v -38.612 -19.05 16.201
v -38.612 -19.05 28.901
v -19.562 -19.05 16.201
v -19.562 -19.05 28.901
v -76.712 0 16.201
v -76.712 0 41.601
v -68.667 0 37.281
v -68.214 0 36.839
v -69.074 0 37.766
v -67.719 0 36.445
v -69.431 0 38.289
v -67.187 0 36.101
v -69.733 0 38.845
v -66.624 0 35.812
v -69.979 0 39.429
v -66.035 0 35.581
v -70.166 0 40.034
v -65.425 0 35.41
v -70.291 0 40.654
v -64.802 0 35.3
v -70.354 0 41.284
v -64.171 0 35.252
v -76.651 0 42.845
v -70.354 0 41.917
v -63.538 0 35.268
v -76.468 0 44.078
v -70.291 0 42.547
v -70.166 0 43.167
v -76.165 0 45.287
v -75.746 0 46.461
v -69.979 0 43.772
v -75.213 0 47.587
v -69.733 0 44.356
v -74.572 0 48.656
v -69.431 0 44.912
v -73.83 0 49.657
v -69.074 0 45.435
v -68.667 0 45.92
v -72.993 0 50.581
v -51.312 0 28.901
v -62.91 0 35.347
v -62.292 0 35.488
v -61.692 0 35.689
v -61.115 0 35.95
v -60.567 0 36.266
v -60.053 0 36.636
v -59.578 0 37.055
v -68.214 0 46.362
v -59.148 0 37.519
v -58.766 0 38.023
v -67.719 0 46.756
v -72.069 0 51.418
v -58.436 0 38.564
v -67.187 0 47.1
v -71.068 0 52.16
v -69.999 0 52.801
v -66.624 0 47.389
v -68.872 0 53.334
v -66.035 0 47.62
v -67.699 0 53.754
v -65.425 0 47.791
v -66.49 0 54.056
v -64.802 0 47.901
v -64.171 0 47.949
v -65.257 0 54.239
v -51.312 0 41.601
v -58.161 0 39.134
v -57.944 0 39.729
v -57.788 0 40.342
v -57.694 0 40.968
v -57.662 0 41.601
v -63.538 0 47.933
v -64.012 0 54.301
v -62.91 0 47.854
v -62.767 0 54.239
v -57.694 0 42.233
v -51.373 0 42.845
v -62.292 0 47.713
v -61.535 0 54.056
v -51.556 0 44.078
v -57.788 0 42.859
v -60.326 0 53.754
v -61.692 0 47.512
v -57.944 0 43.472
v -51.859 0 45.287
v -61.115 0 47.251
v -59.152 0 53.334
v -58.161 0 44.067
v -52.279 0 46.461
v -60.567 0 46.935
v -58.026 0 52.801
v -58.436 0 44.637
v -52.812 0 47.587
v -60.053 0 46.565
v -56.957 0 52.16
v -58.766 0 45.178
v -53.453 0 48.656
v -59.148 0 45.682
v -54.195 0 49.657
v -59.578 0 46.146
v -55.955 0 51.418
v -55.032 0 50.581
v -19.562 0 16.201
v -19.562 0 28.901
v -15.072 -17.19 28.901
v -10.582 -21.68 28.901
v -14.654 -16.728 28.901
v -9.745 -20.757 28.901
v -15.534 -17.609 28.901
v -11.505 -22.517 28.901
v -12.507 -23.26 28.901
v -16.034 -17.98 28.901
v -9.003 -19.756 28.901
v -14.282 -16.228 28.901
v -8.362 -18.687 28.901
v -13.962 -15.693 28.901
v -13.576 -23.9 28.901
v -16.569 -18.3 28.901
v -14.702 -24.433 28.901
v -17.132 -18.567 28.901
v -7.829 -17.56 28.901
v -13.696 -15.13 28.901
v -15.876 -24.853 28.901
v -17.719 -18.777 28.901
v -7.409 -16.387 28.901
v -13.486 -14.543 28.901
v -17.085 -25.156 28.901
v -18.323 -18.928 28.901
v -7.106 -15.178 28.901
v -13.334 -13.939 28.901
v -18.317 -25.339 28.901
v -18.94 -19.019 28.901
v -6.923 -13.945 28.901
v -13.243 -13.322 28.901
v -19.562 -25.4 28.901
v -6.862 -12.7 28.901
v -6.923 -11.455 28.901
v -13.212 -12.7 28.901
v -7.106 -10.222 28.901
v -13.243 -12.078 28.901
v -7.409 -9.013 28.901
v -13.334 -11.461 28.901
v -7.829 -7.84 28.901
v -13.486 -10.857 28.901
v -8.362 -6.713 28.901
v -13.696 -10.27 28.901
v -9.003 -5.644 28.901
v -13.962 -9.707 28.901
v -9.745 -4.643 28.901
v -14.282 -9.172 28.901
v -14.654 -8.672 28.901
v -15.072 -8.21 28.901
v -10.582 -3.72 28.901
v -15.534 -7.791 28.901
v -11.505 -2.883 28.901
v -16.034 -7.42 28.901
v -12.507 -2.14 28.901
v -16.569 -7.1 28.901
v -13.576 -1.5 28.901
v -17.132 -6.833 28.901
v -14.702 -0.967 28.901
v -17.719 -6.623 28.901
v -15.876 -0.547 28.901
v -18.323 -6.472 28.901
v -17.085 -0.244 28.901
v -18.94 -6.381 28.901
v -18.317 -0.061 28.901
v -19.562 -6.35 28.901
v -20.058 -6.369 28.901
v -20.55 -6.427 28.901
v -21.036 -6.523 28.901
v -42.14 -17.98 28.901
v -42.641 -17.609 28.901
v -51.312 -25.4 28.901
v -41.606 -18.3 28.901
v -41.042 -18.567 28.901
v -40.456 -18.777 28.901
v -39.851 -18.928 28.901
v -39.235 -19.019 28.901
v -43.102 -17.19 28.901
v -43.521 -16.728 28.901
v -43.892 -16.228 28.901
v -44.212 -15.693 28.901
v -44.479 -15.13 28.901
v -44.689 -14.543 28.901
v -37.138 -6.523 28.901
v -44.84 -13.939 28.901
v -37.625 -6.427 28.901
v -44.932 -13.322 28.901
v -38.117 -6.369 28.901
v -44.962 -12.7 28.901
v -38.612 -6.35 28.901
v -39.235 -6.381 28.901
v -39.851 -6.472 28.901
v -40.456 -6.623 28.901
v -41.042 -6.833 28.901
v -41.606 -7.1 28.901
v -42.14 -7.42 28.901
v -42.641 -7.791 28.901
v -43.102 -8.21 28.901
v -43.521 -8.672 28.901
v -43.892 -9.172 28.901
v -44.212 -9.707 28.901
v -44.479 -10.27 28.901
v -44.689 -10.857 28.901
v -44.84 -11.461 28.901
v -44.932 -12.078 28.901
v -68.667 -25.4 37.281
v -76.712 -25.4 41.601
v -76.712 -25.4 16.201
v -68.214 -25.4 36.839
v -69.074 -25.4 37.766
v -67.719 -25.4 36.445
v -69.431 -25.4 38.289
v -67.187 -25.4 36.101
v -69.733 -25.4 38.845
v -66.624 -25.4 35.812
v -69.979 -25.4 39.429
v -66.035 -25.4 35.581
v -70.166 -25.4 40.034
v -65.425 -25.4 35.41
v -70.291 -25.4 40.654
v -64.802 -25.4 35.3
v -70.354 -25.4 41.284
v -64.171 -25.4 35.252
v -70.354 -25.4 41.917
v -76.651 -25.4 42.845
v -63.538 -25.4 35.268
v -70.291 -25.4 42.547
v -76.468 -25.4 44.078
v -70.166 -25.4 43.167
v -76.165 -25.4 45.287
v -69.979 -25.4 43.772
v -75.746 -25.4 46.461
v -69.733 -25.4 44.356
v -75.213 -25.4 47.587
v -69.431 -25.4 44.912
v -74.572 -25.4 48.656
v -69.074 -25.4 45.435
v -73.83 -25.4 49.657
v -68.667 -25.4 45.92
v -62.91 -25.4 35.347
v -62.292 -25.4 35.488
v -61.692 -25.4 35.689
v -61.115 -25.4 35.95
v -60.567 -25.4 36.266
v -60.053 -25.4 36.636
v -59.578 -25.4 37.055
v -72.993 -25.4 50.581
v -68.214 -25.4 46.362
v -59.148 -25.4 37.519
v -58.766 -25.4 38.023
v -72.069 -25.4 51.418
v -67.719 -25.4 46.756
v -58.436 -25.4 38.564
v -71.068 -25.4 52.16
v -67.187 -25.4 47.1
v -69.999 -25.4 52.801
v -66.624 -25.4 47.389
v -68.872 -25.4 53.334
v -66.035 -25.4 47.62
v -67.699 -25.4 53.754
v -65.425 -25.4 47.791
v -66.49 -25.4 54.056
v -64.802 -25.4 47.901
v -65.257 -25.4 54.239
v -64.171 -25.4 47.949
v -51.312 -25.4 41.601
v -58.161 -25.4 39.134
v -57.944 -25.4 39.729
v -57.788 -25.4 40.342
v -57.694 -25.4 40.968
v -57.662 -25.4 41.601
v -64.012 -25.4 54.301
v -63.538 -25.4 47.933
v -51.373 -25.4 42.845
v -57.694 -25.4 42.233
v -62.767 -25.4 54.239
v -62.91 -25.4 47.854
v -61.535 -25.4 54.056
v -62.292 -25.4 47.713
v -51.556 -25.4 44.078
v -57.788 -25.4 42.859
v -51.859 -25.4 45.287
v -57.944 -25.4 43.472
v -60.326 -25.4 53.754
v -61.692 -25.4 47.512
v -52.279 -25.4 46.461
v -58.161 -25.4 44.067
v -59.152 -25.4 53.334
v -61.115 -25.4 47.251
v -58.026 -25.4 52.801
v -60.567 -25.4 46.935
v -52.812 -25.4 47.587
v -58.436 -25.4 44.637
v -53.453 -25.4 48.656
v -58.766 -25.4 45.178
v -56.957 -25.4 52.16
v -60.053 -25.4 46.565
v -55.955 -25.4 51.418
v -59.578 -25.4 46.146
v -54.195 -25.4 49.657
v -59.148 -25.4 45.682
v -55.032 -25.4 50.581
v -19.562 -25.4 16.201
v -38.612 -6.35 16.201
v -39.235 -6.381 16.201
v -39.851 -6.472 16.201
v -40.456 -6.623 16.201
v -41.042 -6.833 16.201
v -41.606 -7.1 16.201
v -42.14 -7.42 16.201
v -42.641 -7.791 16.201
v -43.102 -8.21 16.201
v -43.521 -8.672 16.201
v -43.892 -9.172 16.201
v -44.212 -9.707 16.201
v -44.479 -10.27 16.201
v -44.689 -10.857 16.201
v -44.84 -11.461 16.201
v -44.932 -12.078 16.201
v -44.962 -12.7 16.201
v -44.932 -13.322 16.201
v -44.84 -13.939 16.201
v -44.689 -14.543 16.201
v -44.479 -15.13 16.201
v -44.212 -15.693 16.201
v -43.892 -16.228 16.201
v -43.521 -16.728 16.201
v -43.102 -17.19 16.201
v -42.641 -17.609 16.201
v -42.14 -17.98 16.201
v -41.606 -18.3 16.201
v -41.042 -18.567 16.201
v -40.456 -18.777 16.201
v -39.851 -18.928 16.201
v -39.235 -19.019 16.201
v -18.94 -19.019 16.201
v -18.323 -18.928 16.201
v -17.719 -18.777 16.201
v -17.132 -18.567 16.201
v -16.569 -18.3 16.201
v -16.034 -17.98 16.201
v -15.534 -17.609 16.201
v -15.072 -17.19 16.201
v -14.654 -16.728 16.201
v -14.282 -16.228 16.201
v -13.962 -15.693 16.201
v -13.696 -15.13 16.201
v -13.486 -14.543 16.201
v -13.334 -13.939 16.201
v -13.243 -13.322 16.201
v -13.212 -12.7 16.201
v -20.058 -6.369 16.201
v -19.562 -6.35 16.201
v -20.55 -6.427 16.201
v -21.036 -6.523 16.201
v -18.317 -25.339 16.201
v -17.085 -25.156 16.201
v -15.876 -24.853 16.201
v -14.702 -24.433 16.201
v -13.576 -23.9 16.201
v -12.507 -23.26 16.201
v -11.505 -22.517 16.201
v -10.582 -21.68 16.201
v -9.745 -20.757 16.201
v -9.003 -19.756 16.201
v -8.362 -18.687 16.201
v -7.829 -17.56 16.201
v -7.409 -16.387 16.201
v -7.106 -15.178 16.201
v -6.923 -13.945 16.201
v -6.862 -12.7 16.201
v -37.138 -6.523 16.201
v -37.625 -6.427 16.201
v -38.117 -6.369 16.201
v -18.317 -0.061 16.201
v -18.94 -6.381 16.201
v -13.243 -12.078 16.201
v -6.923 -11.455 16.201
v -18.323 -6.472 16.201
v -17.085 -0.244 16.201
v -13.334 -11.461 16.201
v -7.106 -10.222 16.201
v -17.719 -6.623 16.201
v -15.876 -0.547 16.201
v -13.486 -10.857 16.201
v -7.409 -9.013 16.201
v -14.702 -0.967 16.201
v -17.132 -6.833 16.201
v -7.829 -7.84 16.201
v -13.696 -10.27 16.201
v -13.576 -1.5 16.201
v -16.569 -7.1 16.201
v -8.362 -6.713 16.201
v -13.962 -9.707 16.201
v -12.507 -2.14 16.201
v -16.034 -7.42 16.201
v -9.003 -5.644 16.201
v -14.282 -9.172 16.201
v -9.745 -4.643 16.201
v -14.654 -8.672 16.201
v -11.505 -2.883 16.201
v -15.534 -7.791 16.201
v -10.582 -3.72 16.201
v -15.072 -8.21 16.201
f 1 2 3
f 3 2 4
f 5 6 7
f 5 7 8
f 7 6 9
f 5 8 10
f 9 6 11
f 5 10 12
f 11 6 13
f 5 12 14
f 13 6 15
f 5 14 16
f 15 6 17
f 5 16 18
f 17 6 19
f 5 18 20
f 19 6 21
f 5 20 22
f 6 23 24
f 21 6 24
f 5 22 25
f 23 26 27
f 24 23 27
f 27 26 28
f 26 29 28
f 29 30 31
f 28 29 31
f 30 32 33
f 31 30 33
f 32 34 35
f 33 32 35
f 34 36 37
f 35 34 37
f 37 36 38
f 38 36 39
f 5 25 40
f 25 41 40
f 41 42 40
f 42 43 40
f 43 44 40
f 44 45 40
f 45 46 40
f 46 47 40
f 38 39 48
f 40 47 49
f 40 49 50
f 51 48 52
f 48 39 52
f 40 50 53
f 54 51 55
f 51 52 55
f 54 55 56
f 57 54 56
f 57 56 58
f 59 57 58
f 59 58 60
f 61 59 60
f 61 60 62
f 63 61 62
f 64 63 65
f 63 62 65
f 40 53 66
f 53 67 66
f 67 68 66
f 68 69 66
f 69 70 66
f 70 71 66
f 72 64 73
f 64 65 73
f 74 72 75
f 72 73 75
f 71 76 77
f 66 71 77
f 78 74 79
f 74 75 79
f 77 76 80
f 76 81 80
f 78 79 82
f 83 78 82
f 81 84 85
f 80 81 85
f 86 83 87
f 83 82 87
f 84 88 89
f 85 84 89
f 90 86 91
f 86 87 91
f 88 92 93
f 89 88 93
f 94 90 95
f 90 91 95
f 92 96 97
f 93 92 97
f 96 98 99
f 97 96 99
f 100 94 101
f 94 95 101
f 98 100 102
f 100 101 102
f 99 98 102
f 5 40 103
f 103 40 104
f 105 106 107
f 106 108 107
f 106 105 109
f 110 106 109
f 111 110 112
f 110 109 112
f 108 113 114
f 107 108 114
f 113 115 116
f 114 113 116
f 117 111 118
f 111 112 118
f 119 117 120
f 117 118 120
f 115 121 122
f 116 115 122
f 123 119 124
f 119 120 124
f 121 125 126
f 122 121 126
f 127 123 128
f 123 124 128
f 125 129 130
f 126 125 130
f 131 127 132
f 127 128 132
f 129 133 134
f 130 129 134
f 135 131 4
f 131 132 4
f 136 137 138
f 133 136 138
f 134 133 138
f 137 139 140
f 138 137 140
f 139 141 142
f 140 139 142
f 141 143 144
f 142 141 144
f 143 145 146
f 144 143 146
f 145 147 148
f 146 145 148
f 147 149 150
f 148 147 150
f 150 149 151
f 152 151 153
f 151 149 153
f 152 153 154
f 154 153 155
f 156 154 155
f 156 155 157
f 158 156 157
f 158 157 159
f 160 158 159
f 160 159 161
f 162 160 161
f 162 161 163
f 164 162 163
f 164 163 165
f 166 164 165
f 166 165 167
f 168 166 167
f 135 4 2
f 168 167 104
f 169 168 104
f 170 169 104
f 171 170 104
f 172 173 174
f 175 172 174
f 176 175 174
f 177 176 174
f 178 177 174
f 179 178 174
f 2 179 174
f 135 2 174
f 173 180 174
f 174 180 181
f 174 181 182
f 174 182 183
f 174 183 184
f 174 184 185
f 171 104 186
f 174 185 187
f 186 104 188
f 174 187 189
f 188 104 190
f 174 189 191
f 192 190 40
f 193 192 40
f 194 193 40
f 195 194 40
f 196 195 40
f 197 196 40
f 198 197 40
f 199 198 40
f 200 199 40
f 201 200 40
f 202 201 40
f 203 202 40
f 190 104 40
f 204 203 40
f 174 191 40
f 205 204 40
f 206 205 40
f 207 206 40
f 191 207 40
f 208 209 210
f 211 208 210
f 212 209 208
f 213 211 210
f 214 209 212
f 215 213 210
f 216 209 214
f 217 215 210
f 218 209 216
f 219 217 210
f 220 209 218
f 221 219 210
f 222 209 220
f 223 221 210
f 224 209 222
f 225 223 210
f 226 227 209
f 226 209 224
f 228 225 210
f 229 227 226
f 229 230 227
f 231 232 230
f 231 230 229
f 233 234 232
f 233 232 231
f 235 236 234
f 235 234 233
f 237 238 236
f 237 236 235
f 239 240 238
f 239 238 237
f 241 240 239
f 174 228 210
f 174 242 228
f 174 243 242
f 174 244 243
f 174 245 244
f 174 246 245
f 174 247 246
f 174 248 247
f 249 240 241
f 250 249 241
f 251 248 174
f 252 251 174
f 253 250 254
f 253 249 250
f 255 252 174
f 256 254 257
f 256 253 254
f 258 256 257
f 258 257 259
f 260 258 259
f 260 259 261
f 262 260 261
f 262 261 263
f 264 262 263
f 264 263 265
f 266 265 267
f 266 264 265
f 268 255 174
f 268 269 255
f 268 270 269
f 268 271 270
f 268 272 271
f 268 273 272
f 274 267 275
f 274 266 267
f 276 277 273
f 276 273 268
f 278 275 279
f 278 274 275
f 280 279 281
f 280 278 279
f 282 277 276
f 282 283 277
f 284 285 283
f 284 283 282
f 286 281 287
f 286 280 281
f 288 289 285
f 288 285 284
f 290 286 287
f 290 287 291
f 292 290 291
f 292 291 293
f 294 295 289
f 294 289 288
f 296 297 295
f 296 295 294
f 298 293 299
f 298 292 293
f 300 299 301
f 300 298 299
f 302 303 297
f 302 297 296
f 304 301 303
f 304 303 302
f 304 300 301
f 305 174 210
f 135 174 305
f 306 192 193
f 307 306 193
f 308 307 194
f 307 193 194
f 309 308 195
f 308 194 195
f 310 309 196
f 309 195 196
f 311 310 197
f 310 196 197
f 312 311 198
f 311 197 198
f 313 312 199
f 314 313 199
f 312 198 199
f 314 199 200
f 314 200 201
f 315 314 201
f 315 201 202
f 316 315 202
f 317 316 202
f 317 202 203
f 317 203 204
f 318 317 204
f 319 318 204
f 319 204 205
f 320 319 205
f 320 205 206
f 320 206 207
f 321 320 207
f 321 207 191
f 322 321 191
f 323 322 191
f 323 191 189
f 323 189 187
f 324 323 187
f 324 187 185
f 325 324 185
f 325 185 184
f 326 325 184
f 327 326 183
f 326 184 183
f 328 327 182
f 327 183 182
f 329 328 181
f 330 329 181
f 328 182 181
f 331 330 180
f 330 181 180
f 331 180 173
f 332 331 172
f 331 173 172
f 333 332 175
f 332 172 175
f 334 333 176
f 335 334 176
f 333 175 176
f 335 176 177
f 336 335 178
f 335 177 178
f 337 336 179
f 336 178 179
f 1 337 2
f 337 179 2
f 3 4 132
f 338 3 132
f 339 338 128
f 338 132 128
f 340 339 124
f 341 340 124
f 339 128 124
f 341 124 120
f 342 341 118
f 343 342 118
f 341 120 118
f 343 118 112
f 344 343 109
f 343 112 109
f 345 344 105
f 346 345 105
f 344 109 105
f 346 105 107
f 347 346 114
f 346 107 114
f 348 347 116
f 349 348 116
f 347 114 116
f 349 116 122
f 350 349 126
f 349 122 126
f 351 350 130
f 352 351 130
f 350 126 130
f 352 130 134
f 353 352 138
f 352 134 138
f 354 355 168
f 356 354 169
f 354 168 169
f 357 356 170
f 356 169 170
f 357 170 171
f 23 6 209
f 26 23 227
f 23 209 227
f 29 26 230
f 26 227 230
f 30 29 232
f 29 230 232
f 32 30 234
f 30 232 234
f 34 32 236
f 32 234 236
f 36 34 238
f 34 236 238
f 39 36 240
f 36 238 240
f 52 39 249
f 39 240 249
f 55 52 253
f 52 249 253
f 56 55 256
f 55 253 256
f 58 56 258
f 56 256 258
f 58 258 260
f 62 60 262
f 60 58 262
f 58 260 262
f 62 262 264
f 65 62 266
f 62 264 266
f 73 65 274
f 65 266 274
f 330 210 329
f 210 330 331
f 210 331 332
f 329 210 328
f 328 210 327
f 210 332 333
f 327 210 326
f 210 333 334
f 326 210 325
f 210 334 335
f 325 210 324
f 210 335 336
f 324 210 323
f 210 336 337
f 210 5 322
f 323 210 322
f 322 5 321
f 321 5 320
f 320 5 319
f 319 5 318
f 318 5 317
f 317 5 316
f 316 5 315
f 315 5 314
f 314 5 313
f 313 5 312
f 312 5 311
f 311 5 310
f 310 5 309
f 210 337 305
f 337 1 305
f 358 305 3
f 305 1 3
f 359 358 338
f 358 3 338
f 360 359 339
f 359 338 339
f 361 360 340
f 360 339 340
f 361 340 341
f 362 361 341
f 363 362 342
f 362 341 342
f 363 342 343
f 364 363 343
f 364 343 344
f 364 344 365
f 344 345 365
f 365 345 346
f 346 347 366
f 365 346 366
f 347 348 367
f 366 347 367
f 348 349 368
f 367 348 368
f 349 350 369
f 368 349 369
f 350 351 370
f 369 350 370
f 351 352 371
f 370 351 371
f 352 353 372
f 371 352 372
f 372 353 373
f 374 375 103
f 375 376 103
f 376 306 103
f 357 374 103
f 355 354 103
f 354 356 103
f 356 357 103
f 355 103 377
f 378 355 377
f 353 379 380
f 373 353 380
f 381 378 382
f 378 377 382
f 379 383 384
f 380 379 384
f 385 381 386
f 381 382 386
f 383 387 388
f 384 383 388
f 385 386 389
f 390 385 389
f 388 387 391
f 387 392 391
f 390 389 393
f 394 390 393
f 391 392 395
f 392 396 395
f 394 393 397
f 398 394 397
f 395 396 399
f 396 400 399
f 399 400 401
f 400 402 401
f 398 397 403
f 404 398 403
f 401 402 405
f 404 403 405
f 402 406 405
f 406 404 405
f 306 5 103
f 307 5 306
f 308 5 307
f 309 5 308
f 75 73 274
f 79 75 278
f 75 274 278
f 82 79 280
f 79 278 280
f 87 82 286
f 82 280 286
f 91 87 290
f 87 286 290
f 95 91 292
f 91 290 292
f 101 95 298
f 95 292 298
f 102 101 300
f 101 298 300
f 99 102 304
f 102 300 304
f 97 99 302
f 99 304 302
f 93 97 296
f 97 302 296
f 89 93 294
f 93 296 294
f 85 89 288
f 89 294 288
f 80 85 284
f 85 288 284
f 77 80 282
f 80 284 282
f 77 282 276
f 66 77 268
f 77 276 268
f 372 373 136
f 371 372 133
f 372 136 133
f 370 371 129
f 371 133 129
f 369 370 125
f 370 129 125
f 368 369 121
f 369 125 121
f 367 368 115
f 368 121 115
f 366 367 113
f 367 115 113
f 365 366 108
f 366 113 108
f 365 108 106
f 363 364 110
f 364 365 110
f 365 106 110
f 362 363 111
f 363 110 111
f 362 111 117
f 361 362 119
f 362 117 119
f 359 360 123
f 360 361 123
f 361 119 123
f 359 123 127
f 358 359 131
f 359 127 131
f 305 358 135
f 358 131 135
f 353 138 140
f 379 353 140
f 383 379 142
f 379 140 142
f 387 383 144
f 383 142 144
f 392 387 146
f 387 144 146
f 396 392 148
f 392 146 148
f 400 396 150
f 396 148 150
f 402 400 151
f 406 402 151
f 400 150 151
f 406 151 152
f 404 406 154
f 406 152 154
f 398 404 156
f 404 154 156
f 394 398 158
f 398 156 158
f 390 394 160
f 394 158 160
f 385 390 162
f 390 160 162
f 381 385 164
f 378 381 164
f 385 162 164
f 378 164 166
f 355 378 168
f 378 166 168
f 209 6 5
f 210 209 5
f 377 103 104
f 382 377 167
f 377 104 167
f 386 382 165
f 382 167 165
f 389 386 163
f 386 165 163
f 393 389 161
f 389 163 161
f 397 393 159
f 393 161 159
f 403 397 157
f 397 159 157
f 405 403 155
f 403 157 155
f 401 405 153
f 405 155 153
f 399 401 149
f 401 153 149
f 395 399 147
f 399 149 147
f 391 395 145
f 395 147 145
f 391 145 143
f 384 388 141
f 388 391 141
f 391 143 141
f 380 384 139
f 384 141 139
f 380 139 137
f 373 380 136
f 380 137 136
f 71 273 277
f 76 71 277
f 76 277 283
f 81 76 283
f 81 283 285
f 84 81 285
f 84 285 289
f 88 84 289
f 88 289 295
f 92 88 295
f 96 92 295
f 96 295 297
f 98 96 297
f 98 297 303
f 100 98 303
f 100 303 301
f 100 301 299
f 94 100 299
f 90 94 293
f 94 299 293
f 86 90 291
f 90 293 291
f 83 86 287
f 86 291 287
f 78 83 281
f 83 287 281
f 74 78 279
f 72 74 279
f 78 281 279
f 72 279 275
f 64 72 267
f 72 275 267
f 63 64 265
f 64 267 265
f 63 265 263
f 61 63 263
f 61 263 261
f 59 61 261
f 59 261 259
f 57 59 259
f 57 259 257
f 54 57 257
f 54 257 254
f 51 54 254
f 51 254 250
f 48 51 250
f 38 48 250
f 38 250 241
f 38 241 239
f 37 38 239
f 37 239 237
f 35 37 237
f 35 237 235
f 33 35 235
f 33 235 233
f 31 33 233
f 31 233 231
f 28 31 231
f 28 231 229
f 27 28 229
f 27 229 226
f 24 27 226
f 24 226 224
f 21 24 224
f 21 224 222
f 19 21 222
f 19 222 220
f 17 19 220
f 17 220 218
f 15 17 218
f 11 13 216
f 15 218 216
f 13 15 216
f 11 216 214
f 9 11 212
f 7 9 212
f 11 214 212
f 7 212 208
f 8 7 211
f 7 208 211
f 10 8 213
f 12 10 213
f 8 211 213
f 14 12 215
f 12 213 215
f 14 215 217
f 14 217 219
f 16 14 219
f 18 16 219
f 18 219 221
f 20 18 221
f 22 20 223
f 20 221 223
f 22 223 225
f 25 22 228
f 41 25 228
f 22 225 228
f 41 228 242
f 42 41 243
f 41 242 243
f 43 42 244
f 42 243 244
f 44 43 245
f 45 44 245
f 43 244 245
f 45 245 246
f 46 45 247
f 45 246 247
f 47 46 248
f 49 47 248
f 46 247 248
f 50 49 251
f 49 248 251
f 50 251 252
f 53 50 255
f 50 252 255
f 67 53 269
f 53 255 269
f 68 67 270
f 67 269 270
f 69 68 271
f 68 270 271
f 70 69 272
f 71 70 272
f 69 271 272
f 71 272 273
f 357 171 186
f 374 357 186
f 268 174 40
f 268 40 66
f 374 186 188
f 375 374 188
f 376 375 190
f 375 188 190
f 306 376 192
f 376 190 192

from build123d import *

# Parameters (mm, degrees)
F1_DEPTH  = 25.4
F4_DEPTH  = 25.401
F3_R      = 6.35
F5_DEPTH  = 25.401
F8_DEPTH  = 12.701
F9_DEPTH  = 12.701
F11_DEPTH = 12.701


with BuildPart() as f1:
    # F0 (on Front) → F1 (new body)
    with BuildSketch(Plane.XZ):
        Polygon((-51.3122697964, 54.3005044411), (-76.7122697964, 54.3005044411), (-76.7122697964, 16.2005044411), (-6.8622697964, 16.2005044411), (-6.8622697964, 28.9005044411), (-51.3122697964, 28.9005044411), align=None)
    extrude(amount=F1_DEPTH)

    # F2 (on face) → F4 (cut, through all)
    with BuildSketch(Plane.XZ.offset(25.4)):
        with BuildLine():
            ThreePointArc((-76.7122697964, 41.6005044411), (-72.9925259175, 50.5807605622), (-64.0122697964, 54.3005044411))
            Line((-64.0122697964, 54.3005044411), (-76.7122697964, 54.3005044411))
            Line((-76.7122697964, 54.3005044411), (-76.7122697964, 41.6005044411))
        make_face()
        with BuildLine():
            ThreePointArc((-64.0122697964, 54.3005044411), (-55.0320136754, 50.5807605622), (-51.3122697964, 41.6005044411))
            Line((-51.3122697964, 41.6005044411), (-51.3122697964, 54.3005044411))
            Line((-51.3122697964, 54.3005044411), (-64.0122697964, 54.3005044411))
        make_face()
    extrude(amount=-F4_DEPTH, mode=Mode.SUBTRACT)

    # F3 (on face) → F5 (cut, through all)
    with BuildSketch(Plane.XZ.offset(25.4)):
        with Locations((-64.0122697964, 41.6005044411)):
            Circle(F3_R)
    extrude(amount=-F5_DEPTH, mode=Mode.SUBTRACT)

    # F6 (on face) → F8 (cut, through all)
    with BuildSketch(Plane.XY.offset(28.9005044411)):
        with BuildLine():
            ThreePointArc((-38.6122697964, -19.05), (-34.1221417359, -17.1901280605), (-32.2622697964, -12.7))
            ThreePointArc((-32.2622697964, -12.7), (-34.1221417359, -8.2098719395), (-38.6122697964, -6.35))
            ThreePointArc((-38.6122697964, -6.35), (-44.9622697964, -12.7), (-38.6122697964, -19.05))
        make_face()
        with BuildLine():
            ThreePointArc((-13.2122697964, -12.7), (-15.0721417359, -8.2098719395), (-19.5622697964, -6.35))
            ThreePointArc((-19.5622697964, -6.35), (-25.9122697964, -12.7), (-19.5622697964, -19.05))
            ThreePointArc((-19.5622697964, -19.05), (-15.0721417359, -17.1901280605), (-13.2122697964, -12.7))
        make_face()
    extrude(amount=-F8_DEPTH, mode=Mode.SUBTRACT)

    # F7 (on face) → F9 (cut, through all)
    with BuildSketch(Plane.XY.offset(28.9005044411)):
        with BuildLine():
            Line((-21.0363403239, -6.5234624522), (-37.1381992689, -6.5234624522))
            ThreePointArc((-37.1381992689, -6.5234624522), (-33.6281526304, -8.7654001379), (-32.2622697964, -12.7))
            ThreePointArc((-32.2622697964, -12.7), (-34.1221417359, -17.1901280605), (-38.6122697964, -19.05))
            Line((-38.6122697964, -19.05), (-19.5622697964, -19.05))
            ThreePointArc((-19.5622697964, -19.05), (-25.8687550865, -13.4421208026), (-21.0363403239, -6.5234624522))
        make_face()
    extrude(amount=-F9_DEPTH, mode=Mode.SUBTRACT)

    # F10 (on face) → F11 (cut, through all)
    with BuildSketch(Plane.XY.offset(28.9005044411)):
        with BuildLine():
            ThreePointArc((-19.5622697964, 0), (-10.5820136754, -3.7197438789), (-6.8622697964, -12.7))
            Line((-6.8622697964, -12.7), (-6.8622697964, 0))
            Line((-6.8622697964, 0), (-19.5622697964, 0))
        make_face()
        with BuildLine():
            Line((-6.8622697964, -25.4), (-6.8622697964, -12.7))
            ThreePointArc((-6.8622697964, -12.7), (-10.5820136754, -21.6802561211), (-19.5622697964, -25.4))
            Line((-19.5622697964, -25.4), (-6.8622697964, -25.4))
        make_face()
    extrude(amount=-F11_DEPTH, mode=Mode.SUBTRACT)


solid = f1.part
